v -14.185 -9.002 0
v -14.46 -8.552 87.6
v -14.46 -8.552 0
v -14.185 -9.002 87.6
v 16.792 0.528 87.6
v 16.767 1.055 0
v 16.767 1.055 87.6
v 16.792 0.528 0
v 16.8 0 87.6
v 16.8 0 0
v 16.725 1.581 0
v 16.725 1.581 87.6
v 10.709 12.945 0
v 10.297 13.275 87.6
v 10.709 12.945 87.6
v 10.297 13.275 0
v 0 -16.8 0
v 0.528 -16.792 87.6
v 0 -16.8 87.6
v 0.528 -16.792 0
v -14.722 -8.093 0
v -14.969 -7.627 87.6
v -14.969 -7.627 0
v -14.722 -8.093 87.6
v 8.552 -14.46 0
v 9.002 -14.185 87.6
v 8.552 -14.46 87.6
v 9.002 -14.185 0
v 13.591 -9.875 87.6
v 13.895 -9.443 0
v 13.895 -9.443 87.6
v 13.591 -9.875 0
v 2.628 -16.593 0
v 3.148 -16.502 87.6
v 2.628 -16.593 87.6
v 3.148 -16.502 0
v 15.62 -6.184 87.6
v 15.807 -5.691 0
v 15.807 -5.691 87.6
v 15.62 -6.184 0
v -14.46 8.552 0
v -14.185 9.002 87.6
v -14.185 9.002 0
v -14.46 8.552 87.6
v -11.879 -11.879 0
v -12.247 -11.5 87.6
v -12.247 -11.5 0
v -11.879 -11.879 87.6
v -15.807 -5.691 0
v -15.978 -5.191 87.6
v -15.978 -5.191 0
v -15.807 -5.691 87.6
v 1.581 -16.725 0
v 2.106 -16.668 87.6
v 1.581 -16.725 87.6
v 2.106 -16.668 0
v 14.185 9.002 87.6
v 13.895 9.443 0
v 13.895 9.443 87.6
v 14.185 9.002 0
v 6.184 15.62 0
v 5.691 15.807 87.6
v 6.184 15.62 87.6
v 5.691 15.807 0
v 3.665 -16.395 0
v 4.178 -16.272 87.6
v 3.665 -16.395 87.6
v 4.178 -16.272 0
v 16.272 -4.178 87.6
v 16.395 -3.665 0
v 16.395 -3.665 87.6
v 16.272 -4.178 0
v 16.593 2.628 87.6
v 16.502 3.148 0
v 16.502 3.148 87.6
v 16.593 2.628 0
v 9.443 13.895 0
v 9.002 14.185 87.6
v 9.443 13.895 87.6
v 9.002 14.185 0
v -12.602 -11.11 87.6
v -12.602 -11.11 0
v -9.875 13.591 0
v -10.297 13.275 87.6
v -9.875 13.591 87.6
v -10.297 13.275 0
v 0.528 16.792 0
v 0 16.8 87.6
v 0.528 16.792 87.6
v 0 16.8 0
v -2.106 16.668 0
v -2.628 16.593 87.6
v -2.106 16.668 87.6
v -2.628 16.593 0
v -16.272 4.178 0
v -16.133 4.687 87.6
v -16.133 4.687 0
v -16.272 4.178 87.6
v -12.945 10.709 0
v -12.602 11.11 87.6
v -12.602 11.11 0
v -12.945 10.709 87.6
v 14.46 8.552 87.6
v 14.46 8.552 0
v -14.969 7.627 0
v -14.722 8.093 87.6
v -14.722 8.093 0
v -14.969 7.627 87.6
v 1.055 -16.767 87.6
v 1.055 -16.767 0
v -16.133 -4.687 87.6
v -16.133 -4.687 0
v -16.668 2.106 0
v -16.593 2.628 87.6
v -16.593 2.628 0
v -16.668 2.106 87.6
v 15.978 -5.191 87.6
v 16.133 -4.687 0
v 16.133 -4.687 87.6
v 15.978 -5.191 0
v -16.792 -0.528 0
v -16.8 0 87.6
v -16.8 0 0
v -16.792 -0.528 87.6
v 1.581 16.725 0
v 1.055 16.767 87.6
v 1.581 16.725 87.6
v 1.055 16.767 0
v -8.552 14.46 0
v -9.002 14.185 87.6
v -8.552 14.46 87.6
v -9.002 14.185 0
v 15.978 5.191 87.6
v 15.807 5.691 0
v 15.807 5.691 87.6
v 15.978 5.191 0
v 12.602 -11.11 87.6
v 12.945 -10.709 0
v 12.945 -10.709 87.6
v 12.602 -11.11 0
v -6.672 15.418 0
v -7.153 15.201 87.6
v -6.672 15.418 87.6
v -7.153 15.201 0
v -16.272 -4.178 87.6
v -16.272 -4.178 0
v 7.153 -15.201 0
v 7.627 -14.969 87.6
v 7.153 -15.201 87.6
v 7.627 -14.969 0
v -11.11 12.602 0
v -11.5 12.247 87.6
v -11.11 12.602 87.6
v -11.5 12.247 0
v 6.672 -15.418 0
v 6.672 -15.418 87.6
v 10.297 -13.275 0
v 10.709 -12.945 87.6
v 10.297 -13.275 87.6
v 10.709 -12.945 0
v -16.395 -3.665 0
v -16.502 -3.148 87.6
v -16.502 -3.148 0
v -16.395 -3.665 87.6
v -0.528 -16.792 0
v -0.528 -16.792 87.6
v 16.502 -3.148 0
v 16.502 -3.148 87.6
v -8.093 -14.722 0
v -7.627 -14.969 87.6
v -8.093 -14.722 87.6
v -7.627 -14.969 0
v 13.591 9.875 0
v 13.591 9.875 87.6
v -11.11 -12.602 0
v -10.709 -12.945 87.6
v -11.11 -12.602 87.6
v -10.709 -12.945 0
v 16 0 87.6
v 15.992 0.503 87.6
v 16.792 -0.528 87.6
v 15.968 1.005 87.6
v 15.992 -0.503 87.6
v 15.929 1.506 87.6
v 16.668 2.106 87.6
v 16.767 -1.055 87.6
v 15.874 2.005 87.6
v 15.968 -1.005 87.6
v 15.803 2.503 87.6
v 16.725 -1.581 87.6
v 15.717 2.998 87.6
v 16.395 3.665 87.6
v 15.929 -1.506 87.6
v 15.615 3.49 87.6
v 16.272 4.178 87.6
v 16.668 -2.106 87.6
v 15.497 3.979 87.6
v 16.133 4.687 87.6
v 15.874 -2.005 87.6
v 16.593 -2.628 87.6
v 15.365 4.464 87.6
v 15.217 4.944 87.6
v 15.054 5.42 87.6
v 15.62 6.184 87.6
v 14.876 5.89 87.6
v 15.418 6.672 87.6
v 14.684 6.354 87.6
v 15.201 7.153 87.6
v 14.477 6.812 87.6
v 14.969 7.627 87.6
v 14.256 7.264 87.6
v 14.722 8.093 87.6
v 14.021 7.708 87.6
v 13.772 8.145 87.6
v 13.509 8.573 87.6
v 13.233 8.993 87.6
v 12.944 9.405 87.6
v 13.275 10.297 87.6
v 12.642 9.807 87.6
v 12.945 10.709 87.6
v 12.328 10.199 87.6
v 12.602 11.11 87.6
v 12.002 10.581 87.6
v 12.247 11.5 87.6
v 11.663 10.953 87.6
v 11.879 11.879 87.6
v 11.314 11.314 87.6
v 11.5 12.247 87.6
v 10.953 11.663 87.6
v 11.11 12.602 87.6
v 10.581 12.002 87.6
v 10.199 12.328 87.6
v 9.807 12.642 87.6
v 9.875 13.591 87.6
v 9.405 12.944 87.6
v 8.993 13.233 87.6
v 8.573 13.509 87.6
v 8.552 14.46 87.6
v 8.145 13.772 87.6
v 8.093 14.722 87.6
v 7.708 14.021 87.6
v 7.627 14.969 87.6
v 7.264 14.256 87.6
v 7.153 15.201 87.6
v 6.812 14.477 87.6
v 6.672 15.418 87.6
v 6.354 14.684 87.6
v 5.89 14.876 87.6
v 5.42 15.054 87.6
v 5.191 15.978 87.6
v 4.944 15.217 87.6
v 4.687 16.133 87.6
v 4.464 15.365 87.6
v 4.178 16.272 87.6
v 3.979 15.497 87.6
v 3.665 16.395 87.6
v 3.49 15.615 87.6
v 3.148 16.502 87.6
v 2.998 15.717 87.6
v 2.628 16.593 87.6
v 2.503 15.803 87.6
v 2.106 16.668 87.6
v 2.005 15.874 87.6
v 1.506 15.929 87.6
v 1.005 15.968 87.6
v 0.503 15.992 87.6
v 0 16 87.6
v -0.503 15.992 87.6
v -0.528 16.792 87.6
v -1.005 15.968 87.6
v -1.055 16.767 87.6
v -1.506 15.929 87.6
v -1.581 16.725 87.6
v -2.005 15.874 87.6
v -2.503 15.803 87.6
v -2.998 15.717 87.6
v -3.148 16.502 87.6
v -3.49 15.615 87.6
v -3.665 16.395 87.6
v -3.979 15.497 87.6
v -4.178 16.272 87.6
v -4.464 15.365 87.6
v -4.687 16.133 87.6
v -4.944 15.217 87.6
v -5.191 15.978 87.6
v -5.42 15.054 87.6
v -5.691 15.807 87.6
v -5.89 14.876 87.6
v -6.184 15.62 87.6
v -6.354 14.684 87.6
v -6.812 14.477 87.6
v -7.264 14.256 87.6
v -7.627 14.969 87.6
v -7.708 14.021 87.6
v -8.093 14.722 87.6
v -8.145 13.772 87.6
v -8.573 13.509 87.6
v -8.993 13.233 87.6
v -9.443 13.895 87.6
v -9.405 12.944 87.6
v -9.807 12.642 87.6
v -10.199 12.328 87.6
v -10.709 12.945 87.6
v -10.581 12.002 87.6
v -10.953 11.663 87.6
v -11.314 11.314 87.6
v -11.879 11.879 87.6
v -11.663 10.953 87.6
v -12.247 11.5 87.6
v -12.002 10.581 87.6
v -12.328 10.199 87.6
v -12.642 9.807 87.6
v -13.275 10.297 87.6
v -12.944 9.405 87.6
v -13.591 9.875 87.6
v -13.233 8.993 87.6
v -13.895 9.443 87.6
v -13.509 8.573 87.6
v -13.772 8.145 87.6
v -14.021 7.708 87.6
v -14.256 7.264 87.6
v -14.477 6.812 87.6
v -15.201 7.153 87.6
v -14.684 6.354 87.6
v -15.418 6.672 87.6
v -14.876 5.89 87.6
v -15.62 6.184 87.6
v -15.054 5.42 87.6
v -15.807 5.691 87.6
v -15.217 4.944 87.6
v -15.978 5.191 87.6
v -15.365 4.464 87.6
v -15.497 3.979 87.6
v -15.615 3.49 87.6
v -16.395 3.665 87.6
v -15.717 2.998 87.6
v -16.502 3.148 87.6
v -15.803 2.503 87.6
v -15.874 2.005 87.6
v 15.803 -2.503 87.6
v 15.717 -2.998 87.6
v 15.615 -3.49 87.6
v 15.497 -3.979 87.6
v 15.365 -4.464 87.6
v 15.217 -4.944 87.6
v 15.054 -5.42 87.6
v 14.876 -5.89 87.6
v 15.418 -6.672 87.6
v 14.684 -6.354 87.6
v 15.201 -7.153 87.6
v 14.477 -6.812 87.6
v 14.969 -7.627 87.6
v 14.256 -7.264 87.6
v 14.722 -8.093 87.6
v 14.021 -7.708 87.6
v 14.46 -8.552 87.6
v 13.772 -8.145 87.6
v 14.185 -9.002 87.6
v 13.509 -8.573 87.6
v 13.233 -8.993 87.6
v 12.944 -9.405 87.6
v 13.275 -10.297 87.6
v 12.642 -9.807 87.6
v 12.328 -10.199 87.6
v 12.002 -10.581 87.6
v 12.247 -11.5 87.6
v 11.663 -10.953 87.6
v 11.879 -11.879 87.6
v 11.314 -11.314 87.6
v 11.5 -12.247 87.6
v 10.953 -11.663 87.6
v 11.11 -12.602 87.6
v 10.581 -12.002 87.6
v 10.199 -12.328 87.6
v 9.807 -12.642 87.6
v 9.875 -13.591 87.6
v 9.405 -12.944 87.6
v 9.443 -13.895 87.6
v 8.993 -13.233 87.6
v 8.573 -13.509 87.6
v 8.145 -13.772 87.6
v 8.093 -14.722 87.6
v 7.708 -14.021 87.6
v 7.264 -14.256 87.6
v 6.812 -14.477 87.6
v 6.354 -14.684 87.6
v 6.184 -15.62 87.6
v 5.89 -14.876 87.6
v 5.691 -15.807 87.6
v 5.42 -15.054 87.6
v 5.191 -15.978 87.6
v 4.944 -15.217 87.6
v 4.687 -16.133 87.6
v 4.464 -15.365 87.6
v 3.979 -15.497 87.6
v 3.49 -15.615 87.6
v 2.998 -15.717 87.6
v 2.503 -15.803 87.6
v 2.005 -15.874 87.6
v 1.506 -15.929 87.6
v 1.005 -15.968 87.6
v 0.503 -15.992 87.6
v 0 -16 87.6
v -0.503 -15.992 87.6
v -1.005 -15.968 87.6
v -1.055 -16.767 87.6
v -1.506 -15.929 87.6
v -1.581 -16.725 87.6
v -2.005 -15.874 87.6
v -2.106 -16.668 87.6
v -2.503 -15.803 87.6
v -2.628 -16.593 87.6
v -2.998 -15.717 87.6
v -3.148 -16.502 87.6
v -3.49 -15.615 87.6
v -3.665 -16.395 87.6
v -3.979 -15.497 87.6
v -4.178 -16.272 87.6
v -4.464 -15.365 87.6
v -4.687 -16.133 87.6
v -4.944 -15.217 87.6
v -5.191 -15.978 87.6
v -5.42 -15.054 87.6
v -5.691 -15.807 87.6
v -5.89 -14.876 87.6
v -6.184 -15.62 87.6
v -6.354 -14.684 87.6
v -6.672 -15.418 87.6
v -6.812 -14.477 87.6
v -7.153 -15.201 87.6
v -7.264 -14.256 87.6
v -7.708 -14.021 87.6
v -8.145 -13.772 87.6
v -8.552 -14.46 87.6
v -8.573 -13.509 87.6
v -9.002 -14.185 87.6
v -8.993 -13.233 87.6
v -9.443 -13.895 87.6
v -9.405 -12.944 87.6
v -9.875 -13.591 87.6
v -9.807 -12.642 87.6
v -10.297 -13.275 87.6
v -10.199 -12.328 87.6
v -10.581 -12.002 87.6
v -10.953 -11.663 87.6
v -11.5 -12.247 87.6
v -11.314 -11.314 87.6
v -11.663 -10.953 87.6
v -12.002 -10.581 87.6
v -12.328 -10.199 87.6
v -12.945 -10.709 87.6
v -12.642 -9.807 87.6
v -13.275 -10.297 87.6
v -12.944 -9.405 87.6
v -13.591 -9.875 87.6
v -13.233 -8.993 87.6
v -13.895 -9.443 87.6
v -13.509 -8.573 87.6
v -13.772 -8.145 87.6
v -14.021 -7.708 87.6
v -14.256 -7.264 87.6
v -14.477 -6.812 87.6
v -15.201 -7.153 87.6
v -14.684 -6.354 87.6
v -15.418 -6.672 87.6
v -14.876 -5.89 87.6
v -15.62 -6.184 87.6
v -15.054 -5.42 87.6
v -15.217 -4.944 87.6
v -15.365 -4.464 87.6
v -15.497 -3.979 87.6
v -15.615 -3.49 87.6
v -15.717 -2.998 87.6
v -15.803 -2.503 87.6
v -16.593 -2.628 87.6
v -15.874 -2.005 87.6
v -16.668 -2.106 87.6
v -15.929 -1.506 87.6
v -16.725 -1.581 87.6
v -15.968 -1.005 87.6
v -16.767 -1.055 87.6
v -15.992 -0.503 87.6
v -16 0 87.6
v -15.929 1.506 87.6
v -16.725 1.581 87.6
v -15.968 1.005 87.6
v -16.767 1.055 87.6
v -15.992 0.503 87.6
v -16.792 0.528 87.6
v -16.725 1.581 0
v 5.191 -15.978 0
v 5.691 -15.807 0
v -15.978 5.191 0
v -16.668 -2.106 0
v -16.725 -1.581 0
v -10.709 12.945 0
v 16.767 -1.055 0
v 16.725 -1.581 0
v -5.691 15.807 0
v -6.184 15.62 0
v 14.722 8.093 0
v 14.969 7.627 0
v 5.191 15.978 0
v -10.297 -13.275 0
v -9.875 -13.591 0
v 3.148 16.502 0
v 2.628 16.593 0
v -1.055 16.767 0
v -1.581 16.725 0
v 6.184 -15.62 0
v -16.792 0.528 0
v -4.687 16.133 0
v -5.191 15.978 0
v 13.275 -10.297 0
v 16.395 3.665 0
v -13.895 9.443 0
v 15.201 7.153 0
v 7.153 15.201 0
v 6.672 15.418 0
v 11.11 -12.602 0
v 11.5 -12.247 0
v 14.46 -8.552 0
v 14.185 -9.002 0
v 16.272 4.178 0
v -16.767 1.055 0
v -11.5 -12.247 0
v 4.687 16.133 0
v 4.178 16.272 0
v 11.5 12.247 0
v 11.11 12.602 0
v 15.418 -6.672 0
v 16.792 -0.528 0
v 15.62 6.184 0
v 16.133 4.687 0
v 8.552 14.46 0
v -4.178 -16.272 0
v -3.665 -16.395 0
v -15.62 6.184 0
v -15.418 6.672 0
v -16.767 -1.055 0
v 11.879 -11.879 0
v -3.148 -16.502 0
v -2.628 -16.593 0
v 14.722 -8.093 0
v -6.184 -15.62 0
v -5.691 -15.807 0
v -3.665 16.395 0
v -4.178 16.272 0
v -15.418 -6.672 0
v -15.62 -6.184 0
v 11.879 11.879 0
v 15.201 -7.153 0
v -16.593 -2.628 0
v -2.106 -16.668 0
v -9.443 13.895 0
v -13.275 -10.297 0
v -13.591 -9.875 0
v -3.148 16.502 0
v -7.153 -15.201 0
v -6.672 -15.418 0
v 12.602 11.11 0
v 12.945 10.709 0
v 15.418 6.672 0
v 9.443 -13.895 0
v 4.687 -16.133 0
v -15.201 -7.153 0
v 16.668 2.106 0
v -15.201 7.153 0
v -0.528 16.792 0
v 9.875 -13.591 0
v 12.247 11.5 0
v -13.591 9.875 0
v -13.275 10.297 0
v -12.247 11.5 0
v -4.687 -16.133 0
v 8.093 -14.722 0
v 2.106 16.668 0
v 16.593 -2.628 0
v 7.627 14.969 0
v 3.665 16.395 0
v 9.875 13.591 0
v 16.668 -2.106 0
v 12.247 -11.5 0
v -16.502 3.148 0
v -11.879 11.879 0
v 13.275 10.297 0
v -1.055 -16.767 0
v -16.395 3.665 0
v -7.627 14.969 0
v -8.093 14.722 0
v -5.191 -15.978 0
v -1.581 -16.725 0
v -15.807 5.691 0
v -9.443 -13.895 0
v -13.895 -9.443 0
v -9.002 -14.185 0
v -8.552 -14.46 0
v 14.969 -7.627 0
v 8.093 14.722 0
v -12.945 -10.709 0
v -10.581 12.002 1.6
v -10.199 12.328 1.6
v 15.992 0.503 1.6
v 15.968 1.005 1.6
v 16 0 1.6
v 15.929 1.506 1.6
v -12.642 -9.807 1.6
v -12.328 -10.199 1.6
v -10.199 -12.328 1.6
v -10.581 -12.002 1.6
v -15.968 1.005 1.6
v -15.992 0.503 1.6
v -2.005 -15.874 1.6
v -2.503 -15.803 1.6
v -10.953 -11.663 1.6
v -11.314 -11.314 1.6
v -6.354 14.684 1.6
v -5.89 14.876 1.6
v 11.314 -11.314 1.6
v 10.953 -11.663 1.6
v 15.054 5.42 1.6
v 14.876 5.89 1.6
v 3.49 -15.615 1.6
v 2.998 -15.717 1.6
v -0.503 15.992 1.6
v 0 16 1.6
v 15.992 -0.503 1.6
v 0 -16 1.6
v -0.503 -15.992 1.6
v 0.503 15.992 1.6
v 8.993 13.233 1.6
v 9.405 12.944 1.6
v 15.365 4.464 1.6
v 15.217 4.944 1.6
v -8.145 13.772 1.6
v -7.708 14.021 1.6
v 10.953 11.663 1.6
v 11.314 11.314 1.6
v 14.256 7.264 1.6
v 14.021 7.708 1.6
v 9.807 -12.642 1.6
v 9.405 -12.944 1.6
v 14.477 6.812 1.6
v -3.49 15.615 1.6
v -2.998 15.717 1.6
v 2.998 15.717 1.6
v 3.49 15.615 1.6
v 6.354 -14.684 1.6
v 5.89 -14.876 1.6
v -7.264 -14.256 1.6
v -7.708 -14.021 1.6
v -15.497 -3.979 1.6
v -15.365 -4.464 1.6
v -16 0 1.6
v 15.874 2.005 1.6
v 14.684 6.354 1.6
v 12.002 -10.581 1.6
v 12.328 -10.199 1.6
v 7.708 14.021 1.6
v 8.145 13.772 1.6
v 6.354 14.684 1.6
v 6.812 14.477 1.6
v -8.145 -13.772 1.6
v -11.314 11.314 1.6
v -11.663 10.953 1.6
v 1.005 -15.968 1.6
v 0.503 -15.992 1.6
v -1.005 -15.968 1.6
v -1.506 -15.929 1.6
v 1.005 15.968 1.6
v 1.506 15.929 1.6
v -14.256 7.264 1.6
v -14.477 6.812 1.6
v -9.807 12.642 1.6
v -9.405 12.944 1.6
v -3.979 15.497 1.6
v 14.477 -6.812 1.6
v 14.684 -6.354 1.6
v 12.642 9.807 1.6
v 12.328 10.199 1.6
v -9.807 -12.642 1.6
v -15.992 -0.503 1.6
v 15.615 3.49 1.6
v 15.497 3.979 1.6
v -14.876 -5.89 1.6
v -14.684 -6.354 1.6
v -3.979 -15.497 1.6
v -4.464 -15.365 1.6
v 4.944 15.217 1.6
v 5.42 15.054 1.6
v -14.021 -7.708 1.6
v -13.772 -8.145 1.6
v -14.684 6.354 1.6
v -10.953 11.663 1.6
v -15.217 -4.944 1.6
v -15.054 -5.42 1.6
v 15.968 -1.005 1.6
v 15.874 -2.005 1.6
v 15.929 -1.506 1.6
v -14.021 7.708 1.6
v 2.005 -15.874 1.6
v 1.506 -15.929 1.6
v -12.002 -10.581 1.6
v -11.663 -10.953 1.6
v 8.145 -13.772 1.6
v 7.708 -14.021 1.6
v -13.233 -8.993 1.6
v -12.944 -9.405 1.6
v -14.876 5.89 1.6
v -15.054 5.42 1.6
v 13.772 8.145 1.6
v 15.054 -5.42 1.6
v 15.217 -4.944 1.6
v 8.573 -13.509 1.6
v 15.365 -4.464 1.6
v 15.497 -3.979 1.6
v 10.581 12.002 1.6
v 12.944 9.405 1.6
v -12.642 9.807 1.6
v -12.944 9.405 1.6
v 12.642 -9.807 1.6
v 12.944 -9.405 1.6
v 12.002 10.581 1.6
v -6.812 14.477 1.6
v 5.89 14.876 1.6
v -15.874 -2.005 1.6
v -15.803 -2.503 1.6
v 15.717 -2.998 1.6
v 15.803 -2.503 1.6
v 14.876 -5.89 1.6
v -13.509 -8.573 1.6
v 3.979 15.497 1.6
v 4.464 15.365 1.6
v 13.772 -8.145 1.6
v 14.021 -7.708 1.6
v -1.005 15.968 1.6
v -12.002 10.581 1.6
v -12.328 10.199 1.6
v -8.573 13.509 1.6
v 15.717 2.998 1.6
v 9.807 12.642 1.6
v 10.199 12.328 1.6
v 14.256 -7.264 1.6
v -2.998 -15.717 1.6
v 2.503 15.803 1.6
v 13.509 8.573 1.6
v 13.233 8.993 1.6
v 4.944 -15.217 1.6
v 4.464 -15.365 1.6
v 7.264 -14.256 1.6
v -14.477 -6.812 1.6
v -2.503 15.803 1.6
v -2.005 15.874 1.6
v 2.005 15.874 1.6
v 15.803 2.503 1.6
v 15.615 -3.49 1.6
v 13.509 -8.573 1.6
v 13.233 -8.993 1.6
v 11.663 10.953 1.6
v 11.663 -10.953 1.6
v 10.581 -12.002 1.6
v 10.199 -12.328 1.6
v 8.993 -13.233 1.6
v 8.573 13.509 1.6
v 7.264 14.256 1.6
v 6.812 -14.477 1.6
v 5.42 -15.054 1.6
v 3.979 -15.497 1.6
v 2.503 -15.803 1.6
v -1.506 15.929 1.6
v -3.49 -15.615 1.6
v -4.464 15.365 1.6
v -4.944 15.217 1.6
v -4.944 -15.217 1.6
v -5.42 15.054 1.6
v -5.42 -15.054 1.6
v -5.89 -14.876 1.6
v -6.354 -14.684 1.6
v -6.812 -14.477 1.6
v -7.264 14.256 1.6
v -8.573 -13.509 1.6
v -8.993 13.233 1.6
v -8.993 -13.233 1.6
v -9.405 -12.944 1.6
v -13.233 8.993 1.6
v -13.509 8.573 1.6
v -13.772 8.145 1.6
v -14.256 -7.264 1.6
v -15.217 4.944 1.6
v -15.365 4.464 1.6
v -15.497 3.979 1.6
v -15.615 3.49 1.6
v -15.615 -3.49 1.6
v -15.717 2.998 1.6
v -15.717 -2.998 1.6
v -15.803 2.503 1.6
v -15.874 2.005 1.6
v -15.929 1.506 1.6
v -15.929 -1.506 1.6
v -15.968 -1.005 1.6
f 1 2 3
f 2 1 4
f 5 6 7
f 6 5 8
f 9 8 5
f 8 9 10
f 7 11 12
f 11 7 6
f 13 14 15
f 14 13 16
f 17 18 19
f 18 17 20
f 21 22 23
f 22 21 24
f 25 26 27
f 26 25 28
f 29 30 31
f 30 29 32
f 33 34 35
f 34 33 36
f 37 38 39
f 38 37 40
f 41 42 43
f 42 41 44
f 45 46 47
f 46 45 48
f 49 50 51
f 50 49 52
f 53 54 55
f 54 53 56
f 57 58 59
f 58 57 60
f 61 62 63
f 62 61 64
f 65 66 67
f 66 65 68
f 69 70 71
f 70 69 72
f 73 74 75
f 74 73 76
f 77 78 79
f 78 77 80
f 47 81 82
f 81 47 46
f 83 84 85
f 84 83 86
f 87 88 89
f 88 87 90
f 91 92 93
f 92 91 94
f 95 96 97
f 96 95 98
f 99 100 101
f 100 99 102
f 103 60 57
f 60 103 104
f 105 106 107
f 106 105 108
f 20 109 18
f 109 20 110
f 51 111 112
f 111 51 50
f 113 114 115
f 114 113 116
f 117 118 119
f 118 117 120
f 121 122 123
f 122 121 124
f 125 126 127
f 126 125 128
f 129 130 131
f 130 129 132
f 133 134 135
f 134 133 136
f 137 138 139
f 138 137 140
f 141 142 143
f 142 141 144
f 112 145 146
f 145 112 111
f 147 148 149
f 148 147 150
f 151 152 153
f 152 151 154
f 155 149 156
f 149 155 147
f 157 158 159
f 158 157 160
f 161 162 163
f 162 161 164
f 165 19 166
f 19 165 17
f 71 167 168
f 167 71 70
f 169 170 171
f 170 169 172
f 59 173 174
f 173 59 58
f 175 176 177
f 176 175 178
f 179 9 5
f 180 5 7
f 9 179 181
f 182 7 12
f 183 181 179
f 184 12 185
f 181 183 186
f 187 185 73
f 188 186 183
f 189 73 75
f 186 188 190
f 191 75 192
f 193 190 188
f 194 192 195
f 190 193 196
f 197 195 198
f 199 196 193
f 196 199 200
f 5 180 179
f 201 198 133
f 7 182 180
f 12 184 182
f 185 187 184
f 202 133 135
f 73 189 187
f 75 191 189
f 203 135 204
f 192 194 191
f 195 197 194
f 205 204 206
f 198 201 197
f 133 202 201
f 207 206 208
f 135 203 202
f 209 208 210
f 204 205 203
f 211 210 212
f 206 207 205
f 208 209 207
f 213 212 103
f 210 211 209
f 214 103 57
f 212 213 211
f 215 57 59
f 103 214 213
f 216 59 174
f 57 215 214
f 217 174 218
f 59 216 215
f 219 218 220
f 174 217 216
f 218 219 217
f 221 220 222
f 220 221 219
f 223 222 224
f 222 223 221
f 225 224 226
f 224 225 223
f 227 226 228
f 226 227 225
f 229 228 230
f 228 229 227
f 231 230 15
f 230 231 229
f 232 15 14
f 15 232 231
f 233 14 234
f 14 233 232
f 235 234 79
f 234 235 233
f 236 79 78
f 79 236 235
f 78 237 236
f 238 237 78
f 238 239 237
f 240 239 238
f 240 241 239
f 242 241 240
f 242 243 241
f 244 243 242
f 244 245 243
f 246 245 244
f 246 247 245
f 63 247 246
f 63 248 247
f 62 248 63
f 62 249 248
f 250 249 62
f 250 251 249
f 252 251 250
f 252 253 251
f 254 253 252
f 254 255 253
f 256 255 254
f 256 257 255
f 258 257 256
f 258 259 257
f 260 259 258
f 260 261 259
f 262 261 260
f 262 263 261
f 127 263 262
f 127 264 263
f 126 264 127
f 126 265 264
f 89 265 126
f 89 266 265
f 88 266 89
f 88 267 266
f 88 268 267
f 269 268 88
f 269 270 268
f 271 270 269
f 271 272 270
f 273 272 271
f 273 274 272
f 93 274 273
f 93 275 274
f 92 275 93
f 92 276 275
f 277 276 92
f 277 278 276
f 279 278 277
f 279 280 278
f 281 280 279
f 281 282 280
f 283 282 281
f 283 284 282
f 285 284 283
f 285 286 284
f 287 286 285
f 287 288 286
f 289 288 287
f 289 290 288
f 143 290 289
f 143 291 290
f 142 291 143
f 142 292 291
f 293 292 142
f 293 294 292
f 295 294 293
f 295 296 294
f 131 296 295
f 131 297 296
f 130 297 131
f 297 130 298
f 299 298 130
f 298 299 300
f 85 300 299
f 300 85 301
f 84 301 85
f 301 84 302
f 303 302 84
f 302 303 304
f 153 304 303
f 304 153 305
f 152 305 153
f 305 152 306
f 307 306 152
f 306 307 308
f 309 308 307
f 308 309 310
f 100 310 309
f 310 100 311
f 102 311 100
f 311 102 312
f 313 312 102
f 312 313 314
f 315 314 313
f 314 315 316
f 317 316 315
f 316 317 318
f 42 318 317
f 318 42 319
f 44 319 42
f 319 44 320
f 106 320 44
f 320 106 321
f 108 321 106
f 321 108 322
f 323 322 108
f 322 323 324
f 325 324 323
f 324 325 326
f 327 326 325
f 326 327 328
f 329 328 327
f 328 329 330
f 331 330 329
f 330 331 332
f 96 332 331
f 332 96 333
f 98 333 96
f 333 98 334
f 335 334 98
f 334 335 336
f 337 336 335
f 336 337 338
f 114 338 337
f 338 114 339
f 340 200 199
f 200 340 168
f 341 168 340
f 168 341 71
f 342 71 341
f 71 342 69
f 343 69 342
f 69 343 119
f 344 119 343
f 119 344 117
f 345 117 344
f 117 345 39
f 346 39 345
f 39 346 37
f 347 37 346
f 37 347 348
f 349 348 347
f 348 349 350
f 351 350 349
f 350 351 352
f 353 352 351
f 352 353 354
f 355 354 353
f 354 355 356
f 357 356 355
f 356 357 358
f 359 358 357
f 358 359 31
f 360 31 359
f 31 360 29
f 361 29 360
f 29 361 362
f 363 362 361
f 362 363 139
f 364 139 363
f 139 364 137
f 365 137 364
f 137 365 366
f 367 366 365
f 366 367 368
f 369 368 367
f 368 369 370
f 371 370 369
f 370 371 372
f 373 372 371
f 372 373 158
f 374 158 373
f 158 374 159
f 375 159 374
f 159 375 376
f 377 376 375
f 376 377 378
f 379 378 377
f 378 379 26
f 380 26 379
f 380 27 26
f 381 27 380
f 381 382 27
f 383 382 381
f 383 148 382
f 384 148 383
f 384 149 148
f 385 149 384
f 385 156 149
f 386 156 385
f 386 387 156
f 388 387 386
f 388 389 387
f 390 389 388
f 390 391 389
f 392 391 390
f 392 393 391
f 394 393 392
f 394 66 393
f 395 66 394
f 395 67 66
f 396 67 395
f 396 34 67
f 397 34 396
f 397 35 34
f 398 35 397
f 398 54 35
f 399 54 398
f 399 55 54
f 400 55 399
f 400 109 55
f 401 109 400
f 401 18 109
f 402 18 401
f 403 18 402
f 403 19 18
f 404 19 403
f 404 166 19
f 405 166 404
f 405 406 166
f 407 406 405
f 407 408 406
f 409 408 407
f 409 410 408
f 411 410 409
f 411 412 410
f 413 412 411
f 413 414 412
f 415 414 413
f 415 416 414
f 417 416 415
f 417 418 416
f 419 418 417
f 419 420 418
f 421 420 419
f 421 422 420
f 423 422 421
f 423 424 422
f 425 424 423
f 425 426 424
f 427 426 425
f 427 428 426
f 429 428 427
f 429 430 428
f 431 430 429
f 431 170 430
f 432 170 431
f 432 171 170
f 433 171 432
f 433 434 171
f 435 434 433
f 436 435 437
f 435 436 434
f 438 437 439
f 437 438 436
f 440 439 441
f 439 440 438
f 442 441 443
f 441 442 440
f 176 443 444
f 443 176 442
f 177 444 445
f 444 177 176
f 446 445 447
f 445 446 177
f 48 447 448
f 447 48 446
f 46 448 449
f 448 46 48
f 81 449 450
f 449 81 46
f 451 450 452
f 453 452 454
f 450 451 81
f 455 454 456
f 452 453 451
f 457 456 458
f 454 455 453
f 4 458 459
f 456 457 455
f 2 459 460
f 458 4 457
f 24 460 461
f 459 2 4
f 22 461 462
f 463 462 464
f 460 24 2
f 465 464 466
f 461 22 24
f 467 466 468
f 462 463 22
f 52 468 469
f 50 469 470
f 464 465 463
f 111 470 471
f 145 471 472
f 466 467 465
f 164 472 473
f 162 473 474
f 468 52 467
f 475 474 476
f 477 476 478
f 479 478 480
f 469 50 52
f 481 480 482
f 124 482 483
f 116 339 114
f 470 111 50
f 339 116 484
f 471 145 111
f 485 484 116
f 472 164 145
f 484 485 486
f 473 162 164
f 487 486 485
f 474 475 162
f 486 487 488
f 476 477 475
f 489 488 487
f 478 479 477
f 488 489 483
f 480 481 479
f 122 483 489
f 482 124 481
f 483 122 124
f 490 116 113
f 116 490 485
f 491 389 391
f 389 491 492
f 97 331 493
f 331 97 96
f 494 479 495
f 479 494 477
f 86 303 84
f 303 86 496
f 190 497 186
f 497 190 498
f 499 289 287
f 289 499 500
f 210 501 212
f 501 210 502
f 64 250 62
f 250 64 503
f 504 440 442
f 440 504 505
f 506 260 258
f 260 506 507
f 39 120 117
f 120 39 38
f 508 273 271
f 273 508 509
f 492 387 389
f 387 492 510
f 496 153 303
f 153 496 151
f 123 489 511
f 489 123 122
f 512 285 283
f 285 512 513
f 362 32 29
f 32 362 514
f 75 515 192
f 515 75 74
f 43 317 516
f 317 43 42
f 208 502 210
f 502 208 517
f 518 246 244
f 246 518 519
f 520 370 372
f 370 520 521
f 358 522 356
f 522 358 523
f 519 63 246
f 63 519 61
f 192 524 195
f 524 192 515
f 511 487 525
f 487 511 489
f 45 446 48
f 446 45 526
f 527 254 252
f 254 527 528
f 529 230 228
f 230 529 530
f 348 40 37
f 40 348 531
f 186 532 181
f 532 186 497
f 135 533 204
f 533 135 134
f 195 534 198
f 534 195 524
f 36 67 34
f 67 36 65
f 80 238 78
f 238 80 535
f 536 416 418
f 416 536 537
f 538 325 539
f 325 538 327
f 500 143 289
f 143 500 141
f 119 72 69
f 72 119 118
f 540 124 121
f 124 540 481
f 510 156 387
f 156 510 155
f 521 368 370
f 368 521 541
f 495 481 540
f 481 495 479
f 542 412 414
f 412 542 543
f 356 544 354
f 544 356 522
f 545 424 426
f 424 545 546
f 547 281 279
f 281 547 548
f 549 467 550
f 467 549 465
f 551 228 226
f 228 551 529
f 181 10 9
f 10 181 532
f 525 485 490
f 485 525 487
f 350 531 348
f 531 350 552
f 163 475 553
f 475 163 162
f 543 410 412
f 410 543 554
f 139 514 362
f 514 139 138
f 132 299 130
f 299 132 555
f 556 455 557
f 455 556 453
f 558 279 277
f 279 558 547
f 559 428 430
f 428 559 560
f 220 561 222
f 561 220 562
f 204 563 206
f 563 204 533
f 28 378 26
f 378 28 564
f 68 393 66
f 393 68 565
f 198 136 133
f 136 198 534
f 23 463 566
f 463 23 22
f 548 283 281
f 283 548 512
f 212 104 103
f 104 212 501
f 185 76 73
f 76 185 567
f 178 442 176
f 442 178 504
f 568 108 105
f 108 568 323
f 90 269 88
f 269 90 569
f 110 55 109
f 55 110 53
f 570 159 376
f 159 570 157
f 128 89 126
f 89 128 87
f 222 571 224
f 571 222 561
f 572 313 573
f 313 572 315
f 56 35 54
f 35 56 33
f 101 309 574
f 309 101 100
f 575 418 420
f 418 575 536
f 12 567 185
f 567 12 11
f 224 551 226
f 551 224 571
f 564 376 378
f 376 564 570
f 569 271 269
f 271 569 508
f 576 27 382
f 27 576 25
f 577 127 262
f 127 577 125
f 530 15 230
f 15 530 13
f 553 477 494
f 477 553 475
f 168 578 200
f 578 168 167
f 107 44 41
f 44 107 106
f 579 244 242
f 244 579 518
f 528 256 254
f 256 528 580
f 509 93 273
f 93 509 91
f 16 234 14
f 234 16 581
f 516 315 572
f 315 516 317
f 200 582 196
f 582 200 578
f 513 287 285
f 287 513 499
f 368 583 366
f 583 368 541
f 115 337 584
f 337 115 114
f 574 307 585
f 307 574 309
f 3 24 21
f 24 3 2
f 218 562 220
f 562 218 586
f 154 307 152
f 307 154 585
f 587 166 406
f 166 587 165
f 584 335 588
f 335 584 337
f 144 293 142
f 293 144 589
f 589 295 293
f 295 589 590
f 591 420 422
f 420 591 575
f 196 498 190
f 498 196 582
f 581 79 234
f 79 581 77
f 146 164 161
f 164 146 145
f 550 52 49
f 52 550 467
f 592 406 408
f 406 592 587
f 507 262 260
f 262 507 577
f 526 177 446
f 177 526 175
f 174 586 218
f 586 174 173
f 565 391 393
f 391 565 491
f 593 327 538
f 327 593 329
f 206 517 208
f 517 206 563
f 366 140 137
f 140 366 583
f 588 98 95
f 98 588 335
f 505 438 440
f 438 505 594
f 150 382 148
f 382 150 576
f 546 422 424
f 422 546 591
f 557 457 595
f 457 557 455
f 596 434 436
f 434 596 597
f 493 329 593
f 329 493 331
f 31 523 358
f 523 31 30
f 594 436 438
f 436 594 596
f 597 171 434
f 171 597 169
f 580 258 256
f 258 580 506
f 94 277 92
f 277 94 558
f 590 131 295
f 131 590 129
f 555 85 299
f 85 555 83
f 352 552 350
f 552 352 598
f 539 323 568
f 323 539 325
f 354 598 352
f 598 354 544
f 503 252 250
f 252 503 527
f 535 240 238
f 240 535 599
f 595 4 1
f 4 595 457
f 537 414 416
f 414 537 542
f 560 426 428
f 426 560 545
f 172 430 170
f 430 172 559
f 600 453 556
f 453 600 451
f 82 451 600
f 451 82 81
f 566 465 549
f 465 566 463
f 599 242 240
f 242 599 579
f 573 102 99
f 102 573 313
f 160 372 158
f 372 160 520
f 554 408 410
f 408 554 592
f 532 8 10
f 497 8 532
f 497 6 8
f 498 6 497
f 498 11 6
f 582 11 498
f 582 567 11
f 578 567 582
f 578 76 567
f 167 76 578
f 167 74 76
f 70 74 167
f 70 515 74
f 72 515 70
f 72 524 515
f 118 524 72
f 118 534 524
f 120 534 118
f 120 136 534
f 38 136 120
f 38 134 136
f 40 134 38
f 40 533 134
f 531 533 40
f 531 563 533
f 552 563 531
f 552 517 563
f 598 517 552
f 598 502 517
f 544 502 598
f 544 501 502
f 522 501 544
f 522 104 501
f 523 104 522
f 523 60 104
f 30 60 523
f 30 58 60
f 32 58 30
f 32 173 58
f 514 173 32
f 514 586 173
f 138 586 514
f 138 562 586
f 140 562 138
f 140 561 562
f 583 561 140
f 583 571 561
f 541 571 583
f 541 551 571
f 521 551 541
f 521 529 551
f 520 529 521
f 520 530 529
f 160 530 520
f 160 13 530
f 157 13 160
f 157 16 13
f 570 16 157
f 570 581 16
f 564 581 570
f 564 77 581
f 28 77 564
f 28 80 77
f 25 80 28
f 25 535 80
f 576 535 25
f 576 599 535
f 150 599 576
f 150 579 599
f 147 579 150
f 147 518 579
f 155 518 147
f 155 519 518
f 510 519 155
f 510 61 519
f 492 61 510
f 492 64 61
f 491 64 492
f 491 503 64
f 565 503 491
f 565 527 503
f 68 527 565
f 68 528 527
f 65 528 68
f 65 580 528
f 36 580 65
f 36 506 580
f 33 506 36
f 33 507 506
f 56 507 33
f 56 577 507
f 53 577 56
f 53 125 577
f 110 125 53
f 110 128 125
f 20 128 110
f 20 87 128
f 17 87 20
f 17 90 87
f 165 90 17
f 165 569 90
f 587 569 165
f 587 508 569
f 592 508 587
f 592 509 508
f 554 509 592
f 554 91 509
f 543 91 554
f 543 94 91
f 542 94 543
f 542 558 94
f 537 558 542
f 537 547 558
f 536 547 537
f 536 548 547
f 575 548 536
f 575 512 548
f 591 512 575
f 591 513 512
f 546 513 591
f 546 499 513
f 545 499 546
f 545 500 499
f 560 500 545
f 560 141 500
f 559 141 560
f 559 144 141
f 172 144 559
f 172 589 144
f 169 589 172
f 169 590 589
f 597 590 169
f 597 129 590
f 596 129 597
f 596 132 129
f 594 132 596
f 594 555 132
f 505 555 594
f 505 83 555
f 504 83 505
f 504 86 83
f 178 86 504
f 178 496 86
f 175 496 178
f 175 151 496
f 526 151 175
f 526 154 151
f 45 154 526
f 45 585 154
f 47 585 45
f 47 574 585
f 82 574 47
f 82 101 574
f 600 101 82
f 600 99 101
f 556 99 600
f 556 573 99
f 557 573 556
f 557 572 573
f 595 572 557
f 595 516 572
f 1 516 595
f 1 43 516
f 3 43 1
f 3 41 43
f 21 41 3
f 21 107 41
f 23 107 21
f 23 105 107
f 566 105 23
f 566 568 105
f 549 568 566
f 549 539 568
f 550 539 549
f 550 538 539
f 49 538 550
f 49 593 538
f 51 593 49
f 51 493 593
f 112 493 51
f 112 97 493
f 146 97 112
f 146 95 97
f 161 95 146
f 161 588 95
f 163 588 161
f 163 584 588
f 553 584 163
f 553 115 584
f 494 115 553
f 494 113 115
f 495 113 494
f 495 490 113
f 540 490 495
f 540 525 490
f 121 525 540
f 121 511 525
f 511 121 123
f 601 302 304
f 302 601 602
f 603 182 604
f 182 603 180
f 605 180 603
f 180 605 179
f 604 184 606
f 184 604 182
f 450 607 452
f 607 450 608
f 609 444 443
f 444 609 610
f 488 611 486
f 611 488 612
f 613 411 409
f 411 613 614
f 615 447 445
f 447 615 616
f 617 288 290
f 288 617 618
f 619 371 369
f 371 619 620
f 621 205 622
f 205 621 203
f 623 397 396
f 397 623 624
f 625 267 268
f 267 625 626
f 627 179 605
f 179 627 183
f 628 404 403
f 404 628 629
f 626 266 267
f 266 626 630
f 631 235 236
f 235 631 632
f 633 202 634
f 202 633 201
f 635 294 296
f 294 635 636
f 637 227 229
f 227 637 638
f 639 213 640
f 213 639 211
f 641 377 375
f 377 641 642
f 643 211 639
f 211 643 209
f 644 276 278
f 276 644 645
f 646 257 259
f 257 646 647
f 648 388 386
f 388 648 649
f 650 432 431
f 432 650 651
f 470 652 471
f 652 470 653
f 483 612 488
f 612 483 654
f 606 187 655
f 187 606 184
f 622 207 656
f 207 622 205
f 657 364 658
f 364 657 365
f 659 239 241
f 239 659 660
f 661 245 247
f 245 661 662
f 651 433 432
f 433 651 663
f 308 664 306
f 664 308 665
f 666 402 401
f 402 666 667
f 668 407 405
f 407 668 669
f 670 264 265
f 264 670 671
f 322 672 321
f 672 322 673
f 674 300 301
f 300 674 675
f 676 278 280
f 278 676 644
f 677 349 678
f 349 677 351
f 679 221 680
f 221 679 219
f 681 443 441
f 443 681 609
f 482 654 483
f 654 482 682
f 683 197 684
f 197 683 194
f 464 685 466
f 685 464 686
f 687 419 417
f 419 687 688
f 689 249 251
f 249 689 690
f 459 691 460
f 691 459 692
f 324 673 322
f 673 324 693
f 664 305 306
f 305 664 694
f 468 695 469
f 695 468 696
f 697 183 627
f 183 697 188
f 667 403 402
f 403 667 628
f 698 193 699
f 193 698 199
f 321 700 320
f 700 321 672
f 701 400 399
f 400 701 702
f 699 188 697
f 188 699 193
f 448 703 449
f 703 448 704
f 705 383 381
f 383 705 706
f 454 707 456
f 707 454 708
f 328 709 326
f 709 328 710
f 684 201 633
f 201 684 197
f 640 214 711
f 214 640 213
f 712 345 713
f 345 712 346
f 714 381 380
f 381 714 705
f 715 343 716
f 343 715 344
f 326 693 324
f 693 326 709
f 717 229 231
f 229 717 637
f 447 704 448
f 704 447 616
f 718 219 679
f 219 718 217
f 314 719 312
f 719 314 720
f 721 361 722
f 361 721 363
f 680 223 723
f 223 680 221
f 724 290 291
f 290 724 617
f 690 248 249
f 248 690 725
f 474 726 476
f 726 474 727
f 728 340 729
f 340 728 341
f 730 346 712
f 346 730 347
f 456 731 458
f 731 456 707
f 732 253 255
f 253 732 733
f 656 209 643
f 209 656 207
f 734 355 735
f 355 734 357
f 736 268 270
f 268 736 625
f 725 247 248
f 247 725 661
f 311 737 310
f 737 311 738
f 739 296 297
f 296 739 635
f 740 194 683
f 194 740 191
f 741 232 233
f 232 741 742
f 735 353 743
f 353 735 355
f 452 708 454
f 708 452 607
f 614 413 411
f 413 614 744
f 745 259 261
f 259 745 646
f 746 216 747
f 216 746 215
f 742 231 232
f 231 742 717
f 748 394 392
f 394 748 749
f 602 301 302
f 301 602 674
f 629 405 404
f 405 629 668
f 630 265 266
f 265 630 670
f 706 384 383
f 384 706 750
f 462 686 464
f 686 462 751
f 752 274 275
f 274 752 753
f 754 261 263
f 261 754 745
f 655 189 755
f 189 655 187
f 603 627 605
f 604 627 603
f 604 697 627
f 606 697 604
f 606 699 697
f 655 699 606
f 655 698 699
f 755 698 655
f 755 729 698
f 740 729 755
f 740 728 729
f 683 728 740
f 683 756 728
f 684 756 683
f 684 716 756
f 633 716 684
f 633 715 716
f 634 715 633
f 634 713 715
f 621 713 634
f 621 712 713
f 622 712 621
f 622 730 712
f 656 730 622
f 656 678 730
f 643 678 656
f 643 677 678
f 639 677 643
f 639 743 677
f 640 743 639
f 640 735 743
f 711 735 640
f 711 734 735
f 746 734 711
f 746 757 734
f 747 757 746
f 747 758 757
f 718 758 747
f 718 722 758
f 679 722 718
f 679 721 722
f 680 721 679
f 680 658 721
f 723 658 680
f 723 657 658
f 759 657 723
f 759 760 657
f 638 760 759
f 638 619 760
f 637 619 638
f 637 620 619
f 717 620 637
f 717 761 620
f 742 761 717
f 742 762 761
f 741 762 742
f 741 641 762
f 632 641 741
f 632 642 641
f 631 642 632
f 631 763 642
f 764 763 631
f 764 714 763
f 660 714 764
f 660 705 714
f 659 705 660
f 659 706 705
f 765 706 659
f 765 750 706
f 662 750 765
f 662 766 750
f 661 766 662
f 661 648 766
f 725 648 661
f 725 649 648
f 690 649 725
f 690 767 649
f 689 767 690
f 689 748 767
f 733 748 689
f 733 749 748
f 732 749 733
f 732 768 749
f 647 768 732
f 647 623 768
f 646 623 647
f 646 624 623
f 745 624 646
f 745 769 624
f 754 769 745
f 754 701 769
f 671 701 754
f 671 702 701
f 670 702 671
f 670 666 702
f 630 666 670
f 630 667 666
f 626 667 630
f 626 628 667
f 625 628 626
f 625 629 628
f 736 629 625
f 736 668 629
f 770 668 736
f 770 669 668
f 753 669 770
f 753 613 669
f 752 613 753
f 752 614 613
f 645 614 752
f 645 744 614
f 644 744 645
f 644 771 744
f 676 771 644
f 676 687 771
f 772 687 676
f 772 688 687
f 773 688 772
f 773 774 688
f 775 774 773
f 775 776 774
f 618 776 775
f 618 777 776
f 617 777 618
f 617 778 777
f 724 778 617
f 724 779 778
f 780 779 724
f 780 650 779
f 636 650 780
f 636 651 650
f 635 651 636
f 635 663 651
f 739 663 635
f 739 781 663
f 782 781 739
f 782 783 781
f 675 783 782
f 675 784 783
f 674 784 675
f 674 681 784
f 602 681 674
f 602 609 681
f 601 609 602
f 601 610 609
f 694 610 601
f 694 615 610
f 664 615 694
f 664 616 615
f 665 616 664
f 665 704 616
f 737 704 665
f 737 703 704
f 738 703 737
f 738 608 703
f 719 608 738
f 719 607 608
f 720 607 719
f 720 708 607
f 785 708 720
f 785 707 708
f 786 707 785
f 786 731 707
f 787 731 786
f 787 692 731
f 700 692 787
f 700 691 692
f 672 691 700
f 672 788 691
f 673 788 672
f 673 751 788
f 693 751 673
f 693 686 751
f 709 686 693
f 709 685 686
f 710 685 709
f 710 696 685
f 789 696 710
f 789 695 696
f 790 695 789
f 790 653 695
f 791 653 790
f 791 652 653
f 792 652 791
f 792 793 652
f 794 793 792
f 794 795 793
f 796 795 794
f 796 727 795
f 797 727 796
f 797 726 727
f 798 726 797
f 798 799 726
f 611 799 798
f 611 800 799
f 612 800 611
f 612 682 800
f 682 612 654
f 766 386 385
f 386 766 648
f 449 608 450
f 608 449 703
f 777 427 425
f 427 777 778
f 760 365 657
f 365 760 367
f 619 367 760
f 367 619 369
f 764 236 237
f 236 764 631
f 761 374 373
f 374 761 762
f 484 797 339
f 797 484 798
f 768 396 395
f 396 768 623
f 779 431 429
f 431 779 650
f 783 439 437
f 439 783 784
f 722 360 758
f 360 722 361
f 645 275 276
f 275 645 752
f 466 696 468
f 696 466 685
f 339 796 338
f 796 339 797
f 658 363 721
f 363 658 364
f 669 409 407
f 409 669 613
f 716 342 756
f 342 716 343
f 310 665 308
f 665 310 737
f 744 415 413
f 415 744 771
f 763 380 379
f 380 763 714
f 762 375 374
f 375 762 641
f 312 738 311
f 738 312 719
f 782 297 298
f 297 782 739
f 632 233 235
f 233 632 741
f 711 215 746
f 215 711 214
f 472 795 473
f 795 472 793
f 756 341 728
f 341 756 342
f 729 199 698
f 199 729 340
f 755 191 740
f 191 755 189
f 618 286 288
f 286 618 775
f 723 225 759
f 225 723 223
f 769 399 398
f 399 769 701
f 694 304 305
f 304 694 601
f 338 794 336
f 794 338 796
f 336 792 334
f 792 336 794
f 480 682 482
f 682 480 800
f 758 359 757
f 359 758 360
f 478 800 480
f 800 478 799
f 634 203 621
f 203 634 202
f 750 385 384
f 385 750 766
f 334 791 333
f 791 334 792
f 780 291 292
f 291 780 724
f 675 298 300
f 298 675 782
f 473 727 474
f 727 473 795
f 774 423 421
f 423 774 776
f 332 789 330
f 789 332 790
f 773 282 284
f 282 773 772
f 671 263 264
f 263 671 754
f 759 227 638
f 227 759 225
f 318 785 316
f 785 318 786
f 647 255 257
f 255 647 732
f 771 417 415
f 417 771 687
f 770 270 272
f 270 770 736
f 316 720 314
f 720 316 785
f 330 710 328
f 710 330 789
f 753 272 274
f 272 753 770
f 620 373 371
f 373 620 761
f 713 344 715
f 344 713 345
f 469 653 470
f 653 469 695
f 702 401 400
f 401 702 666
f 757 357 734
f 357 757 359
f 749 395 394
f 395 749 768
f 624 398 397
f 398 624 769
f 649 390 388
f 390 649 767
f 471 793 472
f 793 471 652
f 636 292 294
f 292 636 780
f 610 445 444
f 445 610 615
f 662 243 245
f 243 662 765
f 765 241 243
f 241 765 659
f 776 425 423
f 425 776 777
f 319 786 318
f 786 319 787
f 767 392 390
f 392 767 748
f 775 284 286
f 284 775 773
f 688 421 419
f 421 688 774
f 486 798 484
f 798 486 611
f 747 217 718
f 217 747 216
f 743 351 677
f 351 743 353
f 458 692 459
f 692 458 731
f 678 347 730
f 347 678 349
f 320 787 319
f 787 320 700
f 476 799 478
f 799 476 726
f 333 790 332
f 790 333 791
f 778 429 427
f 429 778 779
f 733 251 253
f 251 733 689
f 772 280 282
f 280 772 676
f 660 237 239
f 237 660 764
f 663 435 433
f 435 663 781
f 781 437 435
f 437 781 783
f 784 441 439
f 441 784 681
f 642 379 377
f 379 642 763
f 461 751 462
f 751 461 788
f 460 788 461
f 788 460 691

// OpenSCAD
$fn=200;

BaseDiameter = 31;
BaseHeight = 6;
TagDiameter = 26;
TagHeight = 0.9;
FullHeight = 6;
HandleThickness = 5;
WallThickness = 1.6;

CaseCapHeigh = 10;
CaseHeight = 14 * FullHeight + 2;

invers = true;
//Tag();
Case();

module Tag()
{
    difference()
    {
        if (invers)
            FullBase();
        translate([0,0,BaseHeight-1])
            Text("3");
    }
}

module Case()
{
    difference()
    {
        cylinder(h=CaseHeight+WallThickness, d=BaseDiameter+1+WallThickness);
        translate([0,0,WallThickness])
            cylinder(h=CaseHeight, d=BaseDiameter+1);
    }
}

module CaseCap()
{
    difference()
    {
        cylinder(h=CaseCapHeigh+WallThickness, d=BaseDiameter+1+2*WallThickness);
        translate([0,0,WallThickness])
            cylinder(h=CaseCapHeigh, d=BaseDiameter+1++WallThickness);
    }
}

module FullBase()
{
    difference()
    {
        cylinder(h=FullHeight, d=BaseDiameter);
        cylinder(h=TagHeight, d=TagDiameter);
    }
}

module Text(text)
{
    textsize = textmetrics(text, size=15, font="Arial:style=Bold").size;
    textposition = textmetrics(text, size=15, font="Arial:style=Bold").position;

    translate([-(textsize.x + textposition.x)/2,-(textsize.y + textposition.y)/2,0])
    {
        linear_extrude(height=1)
        {
            text(text, size=15, font="Arial:style=Bold", $fn=200);
        }
        // translate([textposition.x, textposition.y,1])
        //     cube([textsize.x, textsize.y, 1]);
    }
}
